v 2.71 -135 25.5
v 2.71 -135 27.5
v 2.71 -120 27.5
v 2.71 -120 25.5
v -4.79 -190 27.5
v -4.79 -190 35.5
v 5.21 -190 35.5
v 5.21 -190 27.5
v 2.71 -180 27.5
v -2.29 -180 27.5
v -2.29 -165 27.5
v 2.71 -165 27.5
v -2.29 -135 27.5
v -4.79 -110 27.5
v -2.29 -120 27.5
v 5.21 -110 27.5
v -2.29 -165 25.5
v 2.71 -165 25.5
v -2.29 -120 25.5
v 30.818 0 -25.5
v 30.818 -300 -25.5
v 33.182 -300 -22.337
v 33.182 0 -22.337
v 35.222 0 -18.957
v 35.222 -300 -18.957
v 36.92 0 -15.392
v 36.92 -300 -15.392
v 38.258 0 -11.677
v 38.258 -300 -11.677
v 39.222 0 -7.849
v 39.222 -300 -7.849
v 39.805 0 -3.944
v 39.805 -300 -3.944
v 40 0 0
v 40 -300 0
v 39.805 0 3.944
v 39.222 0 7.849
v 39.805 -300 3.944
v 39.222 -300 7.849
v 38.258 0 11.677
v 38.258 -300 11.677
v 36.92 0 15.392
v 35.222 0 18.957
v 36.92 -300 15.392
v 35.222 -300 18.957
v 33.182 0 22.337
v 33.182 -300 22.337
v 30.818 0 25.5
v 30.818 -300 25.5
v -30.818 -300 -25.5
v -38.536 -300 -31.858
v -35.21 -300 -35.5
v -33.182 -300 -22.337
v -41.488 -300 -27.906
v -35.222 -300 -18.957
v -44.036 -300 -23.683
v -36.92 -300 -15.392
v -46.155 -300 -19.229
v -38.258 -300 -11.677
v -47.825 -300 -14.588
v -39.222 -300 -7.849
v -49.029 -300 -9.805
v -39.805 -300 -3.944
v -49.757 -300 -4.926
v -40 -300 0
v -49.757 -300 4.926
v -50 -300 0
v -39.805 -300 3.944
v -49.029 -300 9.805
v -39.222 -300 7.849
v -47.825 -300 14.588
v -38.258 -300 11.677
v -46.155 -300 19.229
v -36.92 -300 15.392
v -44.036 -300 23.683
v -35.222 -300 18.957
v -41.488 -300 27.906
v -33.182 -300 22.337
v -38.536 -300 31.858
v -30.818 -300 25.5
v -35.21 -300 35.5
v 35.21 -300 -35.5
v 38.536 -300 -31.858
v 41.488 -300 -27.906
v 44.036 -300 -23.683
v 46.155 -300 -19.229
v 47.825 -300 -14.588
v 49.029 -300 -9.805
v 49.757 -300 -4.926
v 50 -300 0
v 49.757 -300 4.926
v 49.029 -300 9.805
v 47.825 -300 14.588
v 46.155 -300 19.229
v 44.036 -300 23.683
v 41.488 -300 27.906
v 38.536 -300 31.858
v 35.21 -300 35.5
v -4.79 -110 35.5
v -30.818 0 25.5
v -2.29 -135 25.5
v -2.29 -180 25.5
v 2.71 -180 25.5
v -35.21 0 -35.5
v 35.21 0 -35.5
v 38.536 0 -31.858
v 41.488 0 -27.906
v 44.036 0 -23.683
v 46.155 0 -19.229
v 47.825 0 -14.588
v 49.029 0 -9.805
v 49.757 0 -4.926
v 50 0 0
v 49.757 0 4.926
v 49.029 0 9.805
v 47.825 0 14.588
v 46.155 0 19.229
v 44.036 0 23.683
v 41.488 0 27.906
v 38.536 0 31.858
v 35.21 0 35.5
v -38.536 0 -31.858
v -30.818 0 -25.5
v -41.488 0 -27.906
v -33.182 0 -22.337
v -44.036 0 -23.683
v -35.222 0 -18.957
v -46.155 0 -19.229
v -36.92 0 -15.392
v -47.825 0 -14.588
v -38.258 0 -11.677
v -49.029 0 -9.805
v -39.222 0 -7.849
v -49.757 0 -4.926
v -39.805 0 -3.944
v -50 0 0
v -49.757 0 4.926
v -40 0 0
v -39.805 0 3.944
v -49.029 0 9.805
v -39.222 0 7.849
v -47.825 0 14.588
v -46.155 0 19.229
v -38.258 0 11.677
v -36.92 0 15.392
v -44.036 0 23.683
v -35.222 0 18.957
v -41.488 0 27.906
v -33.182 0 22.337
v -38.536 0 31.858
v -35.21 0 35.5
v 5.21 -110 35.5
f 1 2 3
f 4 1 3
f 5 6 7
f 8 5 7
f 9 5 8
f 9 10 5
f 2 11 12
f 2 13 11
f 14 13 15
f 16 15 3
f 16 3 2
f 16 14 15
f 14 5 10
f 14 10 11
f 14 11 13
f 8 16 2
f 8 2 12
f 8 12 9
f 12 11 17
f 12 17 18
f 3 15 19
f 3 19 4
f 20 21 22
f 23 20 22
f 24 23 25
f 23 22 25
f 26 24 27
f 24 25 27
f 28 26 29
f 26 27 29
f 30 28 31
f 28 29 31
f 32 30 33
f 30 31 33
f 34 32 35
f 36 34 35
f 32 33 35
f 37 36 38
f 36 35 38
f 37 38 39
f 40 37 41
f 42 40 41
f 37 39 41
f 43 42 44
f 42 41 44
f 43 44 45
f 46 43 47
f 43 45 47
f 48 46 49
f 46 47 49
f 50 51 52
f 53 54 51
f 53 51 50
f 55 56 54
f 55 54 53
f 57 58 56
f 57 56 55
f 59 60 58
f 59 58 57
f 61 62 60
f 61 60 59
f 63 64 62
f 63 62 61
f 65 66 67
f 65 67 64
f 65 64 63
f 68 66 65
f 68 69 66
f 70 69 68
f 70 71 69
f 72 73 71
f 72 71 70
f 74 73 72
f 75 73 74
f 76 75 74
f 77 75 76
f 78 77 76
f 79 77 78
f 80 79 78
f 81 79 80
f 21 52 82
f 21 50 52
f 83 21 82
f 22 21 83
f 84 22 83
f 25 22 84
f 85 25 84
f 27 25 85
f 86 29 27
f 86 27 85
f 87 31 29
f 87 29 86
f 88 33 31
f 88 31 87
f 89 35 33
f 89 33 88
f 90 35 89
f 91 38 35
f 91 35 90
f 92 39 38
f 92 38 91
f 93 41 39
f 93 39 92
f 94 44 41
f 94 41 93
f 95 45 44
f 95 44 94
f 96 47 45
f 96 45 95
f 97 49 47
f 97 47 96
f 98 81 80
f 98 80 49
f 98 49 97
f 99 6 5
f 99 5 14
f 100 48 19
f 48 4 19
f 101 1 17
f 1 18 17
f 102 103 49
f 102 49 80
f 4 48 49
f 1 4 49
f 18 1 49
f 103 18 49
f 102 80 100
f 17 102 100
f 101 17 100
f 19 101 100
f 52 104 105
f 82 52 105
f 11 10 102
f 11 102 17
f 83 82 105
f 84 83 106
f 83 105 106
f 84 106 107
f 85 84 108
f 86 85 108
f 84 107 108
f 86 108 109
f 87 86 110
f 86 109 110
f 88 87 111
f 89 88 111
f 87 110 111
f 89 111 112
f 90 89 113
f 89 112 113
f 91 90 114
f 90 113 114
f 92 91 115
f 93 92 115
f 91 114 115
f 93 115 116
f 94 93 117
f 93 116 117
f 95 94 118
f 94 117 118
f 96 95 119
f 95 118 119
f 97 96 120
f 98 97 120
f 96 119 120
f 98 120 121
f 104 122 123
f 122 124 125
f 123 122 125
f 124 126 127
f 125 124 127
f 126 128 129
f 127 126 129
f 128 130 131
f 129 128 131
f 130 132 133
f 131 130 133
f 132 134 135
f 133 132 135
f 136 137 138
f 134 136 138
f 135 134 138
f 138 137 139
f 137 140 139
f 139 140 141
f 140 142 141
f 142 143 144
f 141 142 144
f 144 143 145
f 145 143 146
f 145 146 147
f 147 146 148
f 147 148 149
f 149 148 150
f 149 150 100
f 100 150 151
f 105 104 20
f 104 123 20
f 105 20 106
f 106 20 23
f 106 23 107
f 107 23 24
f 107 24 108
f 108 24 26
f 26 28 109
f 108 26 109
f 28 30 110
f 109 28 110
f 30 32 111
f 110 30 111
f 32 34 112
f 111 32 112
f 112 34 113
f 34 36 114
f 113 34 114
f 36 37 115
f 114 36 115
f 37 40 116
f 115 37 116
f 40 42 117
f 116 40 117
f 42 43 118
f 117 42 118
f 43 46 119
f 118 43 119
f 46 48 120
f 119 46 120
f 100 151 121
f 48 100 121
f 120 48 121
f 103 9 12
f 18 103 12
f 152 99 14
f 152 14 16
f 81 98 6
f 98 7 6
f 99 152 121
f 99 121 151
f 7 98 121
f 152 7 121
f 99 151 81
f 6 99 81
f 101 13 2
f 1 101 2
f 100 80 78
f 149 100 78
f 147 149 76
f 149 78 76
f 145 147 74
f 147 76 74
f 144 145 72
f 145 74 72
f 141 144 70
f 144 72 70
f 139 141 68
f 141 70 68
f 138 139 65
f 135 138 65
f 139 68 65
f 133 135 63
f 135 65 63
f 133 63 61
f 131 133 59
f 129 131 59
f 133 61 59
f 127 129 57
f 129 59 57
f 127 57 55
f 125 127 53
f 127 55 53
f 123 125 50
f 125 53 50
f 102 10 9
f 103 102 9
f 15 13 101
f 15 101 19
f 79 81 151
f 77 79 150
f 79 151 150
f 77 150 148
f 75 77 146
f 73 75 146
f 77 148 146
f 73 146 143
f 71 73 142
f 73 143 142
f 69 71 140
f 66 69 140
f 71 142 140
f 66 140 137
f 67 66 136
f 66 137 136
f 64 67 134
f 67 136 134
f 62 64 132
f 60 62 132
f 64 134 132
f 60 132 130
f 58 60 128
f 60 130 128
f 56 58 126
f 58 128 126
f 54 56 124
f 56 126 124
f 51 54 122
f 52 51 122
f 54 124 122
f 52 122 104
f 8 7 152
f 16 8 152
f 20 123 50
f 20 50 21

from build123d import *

# Parameters (mm, degrees)
F1_DEPTH = 300
F3_DEPTH = 300
F4_W     = 10
F4_H     = 80
F5_DEPTH = 8
F6_W     = 5
F6_H     = 15
F7_DEPTH = 5


with BuildPart() as f1:
    # F0 (on Front) → F1 (new body)
    with BuildSketch(Plane.XZ):
        with BuildLine():
            Line((35.210084, 35.5), (-35.210084, 35.5))
            ThreePointArc((-35.210084, 35.5), (-50, 0), (-35.210084, -35.5))
            Line((-35.210084, -35.5), (35.210084, -35.5))
            ThreePointArc((35.210084, -35.5), (50, 0), (35.210084, 35.5))
        make_face()
    extrude(amount=F1_DEPTH)

    # F2 (on face) → F3 (cut)
    with BuildSketch(Plane.XZ.offset(300)):
        with BuildLine():
            Line((30.818014, 25.5), (-30.818014, 25.5))
            ThreePointArc((-30.818014, 25.5), (-40, 0), (-30.818014, -25.5))
            Line((-30.818014, -25.5), (30.818014, -25.5))
            ThreePointArc((30.818014, -25.5), (40, 0), (30.818014, 25.5))
        make_face()
    extrude(amount=-F3_DEPTH, mode=Mode.SUBTRACT)

    # F4 (on face) → F5 (cut)
    with BuildSketch(Plane.XY.offset(35.5)):
        with Locations((0.210084, -150)):
            Rectangle(F4_W, F4_H)
    extrude(amount=-F5_DEPTH, mode=Mode.SUBTRACT)

    # F6 (on face) → F7 (cut)
    with BuildSketch(Plane.XY.offset(27.5)):
        with Locations((0.210084, -127.5)):
            Rectangle(F6_W, F6_H)
        with Locations((0.210084, -172.5)):
            Rectangle(F6_W, F6_H)
    extrude(amount=-F7_DEPTH, mode=Mode.SUBTRACT)


solid = f1.part
